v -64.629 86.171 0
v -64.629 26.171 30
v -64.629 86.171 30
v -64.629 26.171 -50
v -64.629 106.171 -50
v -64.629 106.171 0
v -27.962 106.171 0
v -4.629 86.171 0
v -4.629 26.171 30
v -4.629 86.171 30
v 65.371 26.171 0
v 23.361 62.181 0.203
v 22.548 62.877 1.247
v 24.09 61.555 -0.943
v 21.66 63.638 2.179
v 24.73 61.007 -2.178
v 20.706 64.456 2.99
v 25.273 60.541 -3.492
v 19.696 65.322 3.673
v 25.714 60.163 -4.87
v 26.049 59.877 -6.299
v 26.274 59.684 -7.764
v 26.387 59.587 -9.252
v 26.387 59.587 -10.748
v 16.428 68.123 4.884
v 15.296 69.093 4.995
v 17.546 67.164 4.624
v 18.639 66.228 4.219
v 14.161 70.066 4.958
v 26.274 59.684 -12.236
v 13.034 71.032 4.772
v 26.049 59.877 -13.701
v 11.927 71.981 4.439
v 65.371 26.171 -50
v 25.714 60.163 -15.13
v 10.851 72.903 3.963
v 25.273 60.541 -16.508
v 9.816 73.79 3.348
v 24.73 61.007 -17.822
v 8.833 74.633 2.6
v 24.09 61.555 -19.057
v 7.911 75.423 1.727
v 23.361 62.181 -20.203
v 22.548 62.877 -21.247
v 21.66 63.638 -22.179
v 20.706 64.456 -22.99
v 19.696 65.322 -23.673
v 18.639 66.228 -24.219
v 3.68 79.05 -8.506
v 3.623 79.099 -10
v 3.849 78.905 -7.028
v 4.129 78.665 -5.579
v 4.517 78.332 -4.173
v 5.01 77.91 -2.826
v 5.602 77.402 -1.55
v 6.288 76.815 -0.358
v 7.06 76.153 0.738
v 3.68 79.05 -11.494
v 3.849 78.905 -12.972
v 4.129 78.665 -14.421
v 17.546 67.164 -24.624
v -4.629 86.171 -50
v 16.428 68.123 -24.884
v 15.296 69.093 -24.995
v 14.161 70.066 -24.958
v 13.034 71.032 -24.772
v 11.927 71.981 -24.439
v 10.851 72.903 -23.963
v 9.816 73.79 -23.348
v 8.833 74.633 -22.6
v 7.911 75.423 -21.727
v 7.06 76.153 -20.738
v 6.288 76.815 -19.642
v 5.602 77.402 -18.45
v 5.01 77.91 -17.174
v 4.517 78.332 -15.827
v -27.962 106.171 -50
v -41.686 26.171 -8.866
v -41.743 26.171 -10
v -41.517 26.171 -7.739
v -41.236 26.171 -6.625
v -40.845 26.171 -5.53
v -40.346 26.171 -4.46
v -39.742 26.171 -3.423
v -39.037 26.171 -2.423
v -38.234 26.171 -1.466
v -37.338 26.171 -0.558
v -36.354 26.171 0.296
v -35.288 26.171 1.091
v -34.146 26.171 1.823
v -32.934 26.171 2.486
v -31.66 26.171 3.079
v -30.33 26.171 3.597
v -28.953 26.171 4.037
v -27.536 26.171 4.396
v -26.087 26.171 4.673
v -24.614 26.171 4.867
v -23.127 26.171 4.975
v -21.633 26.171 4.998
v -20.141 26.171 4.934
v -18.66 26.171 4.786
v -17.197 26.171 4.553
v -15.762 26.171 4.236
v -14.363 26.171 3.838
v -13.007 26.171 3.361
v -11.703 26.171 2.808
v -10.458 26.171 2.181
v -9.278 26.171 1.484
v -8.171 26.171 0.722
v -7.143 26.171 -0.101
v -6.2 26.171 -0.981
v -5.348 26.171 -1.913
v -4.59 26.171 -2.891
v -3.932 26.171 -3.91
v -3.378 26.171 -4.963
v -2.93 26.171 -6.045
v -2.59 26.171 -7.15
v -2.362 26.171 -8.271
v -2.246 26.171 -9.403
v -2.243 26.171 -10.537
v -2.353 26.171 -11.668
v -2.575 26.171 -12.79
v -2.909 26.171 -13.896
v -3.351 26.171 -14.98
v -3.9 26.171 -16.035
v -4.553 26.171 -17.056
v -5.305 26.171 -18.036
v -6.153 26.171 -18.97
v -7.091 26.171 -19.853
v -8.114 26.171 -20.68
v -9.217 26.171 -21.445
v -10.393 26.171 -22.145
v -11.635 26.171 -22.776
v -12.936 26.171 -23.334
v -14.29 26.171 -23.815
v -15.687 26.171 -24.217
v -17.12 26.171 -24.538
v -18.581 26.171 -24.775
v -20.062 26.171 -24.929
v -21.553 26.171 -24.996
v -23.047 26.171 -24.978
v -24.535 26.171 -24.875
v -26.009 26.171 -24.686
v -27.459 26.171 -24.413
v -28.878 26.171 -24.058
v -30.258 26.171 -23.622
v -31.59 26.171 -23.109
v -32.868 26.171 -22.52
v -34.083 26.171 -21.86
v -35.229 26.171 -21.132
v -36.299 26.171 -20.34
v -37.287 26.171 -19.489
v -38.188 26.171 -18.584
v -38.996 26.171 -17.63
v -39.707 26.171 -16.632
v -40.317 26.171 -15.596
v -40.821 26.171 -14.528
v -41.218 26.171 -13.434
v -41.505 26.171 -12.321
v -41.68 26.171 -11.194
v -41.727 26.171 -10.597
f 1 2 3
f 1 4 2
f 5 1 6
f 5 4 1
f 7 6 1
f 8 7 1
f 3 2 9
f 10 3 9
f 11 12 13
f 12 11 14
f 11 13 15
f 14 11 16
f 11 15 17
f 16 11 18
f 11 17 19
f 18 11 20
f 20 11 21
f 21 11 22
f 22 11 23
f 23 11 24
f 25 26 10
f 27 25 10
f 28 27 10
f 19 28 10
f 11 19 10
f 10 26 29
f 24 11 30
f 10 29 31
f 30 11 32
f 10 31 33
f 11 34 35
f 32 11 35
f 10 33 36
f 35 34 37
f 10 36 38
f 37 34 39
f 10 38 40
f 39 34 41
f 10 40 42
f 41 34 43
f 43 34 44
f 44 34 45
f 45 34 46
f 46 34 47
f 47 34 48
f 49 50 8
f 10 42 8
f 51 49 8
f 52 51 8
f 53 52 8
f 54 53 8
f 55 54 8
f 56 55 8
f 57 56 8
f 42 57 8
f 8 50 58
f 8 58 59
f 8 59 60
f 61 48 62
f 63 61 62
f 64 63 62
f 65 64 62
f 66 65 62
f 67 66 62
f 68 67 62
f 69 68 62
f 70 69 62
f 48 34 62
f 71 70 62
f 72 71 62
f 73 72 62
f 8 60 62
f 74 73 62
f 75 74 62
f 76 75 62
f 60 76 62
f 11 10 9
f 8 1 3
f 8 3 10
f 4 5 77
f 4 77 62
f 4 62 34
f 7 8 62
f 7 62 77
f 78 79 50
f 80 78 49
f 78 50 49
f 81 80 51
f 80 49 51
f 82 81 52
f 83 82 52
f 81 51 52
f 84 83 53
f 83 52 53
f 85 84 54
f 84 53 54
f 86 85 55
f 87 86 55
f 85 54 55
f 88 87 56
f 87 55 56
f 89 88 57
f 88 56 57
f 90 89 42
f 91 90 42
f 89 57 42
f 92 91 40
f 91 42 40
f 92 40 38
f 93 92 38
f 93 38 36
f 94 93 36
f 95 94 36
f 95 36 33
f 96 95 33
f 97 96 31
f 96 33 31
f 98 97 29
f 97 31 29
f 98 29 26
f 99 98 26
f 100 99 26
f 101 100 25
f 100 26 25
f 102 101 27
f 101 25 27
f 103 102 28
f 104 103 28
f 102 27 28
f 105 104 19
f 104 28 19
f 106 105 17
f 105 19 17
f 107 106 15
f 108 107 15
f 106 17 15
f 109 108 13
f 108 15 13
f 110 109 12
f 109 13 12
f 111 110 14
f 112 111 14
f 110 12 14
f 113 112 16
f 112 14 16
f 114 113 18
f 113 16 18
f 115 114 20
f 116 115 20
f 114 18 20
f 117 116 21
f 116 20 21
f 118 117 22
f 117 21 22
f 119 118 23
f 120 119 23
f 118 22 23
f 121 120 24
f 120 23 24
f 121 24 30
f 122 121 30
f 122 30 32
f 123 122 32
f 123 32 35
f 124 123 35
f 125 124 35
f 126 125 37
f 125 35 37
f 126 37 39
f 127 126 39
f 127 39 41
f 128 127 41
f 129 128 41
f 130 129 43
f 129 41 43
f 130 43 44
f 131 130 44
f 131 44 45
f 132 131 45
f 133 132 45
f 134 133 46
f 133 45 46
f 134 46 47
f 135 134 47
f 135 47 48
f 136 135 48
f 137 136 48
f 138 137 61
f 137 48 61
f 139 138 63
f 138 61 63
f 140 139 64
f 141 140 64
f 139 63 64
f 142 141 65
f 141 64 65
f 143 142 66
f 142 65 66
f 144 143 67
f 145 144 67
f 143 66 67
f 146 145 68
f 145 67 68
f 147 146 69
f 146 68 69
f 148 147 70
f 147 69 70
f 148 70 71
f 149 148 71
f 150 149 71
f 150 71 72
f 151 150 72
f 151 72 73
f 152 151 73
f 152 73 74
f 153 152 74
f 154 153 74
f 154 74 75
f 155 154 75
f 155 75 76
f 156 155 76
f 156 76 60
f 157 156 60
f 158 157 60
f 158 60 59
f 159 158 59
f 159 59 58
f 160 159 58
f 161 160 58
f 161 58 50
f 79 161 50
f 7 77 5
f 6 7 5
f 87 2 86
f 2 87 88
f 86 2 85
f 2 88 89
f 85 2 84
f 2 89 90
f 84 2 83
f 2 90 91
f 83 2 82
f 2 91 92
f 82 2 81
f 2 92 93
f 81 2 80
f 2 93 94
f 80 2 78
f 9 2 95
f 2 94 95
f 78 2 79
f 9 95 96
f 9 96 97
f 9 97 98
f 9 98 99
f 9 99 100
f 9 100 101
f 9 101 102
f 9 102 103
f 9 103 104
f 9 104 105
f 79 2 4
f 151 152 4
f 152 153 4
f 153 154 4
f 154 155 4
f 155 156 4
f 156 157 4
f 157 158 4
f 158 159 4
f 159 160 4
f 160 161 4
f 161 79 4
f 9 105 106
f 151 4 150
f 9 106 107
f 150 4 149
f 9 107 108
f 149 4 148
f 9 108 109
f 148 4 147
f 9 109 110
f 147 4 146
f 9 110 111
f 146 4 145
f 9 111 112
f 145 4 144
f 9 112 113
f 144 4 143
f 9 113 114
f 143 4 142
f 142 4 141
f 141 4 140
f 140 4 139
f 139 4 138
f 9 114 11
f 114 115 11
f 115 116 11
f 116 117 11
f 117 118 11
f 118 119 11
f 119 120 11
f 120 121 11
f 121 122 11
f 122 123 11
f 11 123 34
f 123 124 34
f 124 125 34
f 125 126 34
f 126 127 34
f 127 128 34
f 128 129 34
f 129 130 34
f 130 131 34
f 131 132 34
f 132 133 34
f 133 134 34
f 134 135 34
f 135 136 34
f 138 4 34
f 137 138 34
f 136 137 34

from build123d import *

# Parameters (mm, degrees)
BOSS_EXTRUDE1_DEPTH = 50
BOSS_EXTRUDE2_DEPTH = 30
SKETCH3_R           = 15
CUT_EXTRUDE1_DEPTH  = 30
CUT_EXTRUDE3_REACH  = 103.85
CUT_EXTRUDE4_REACH  = 132.508
SKETCH3_3_R         = 15


with BuildPart() as part:
    # Sketch1 → Boss-Extrude1 (new body)
    with BuildSketch(Plane.XY):
        Polygon((-27.961904762, 106.171428571), (-64.628571429, 106.171428571), (-64.628571429, 26.171428571), (65.371428571, 26.171428571), align=None)
    extrude(amount=-BOSS_EXTRUDE1_DEPTH)

    # Sketch1<4> → Boss-Extrude2 (add)
    with BuildSketch(Plane.XY):
        Polygon((-4.628571429, 86.171428571), (-64.628571429, 86.171428571), (-64.628571429, 26.171428571), (65.371428571, 26.171428571), align=None)
    extrude(amount=BOSS_EXTRUDE2_DEPTH)

    # Sketch3 → Cut-Extrude1 (cut)
    with BuildSketch(Plane(origin=(40.618487395, 47.388235294, 0), x_dir=(0.7592566023652969, -0.6507913734559682, 0), z_dir=(0.6507913734559682, 0.7592566023652969, 0))):
        with Locations((-33.725710627, 10)):
            Circle(SKETCH3_R)
    extrude(amount=-CUT_EXTRUDE1_DEPTH, mode=Mode.SUBTRACT)

    # Sketch4 → Cut-Extrude3 (cut, up to next)
    with BuildSketch(Plane(origin=(0, 86.171428571, 0), x_dir=(1, 0, 0), z_dir=(0, 1, 0)), mode=Mode.PRIVATE) as cut_extrude3_sk1:
        Polygon((65.371428571, -30), (-4.628571429, -30), (65.371428571, 0), align=None)
    cut_extrude3_tool1 = extrude(cut_extrude3_sk1.sketch, amount=-CUT_EXTRUDE3_REACH, mode=Mode.PRIVATE) & part.part
    add(cut_extrude3_tool1.solids().sort_by_distance((42.038095, 86.171429, 20))[0], mode=Mode.SUBTRACT)

    # Sketch3<3> → Cut-Extrude4 (cut, up to next)
    with BuildSketch(Plane(origin=(40.618487395, 47.388235294, 0), x_dir=(0.7592566023652969, -0.6507913734559682, 0), z_dir=(0.6507913734559682, 0.7592566023652969, 0)), mode=Mode.PRIVATE) as cut_extrude4_sk1:
        with Locations((-33.725710627, 10)):
            Circle(SKETCH3_3_R)
    cut_extrude4_tool1 = extrude(cut_extrude4_sk1.sketch, amount=-CUT_EXTRUDE4_REACH, mode=Mode.PRIVATE) & part.part
    add(cut_extrude4_tool1.solids().sort_by_distance((15.012019, 69.336637, -10))[0], mode=Mode.SUBTRACT)


solid = part.part
